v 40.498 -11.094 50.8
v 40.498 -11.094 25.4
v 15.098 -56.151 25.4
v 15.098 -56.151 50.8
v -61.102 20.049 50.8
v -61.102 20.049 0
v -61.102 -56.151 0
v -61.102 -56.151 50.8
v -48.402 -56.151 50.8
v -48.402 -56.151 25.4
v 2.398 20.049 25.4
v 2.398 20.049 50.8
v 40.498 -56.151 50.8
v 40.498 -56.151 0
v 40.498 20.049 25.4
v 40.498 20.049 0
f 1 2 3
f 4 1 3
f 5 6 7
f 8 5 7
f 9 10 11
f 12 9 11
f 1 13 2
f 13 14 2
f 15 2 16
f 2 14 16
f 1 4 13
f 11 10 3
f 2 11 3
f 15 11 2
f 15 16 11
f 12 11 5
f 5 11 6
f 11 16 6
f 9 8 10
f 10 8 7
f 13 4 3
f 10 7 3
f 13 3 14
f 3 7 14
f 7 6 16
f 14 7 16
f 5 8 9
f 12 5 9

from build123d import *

# Parameters (mm, degrees)
F0_W     = 101.6
F0_H     = 76.2
F1_DEPTH = 25.4
F5_DEPTH = 25.4
F8_DEPTH = 25.4


# Not quite as in the source:
# - a feature of the source that left no trace in its solid (it failed there, or was rolled back) is left out


with BuildPart() as f1:
    # F0 (on Top) → F1 (new body)
    with BuildSketch(Plane.XY):
        with Locations((-10.3016215888, -18.0514037281)):
            Rectangle(F0_W, F0_H)
    extrude(amount=F1_DEPTH)

    # F4 (on face) → F5 (join)
    with BuildSketch(Plane.XY.offset(25.4)):
        Polygon((15.0983784112, -56.1514037281), (40.4983784112, -56.1514037281), (40.4983784112, -11.0943727195), align=None)
    extrude(amount=F5_DEPTH)

    # F7 (on face) → F8 (join)
    with BuildSketch(Plane.XY.offset(25.4)):
        Polygon((-61.1016215888, -56.1514037281), (-48.4016215888, -56.1514037281), (2.3983784112, 20.0485962719), (-61.1016215888, 20.0485962719), align=None)
    extrude(amount=F8_DEPTH)


solid = f1.part
